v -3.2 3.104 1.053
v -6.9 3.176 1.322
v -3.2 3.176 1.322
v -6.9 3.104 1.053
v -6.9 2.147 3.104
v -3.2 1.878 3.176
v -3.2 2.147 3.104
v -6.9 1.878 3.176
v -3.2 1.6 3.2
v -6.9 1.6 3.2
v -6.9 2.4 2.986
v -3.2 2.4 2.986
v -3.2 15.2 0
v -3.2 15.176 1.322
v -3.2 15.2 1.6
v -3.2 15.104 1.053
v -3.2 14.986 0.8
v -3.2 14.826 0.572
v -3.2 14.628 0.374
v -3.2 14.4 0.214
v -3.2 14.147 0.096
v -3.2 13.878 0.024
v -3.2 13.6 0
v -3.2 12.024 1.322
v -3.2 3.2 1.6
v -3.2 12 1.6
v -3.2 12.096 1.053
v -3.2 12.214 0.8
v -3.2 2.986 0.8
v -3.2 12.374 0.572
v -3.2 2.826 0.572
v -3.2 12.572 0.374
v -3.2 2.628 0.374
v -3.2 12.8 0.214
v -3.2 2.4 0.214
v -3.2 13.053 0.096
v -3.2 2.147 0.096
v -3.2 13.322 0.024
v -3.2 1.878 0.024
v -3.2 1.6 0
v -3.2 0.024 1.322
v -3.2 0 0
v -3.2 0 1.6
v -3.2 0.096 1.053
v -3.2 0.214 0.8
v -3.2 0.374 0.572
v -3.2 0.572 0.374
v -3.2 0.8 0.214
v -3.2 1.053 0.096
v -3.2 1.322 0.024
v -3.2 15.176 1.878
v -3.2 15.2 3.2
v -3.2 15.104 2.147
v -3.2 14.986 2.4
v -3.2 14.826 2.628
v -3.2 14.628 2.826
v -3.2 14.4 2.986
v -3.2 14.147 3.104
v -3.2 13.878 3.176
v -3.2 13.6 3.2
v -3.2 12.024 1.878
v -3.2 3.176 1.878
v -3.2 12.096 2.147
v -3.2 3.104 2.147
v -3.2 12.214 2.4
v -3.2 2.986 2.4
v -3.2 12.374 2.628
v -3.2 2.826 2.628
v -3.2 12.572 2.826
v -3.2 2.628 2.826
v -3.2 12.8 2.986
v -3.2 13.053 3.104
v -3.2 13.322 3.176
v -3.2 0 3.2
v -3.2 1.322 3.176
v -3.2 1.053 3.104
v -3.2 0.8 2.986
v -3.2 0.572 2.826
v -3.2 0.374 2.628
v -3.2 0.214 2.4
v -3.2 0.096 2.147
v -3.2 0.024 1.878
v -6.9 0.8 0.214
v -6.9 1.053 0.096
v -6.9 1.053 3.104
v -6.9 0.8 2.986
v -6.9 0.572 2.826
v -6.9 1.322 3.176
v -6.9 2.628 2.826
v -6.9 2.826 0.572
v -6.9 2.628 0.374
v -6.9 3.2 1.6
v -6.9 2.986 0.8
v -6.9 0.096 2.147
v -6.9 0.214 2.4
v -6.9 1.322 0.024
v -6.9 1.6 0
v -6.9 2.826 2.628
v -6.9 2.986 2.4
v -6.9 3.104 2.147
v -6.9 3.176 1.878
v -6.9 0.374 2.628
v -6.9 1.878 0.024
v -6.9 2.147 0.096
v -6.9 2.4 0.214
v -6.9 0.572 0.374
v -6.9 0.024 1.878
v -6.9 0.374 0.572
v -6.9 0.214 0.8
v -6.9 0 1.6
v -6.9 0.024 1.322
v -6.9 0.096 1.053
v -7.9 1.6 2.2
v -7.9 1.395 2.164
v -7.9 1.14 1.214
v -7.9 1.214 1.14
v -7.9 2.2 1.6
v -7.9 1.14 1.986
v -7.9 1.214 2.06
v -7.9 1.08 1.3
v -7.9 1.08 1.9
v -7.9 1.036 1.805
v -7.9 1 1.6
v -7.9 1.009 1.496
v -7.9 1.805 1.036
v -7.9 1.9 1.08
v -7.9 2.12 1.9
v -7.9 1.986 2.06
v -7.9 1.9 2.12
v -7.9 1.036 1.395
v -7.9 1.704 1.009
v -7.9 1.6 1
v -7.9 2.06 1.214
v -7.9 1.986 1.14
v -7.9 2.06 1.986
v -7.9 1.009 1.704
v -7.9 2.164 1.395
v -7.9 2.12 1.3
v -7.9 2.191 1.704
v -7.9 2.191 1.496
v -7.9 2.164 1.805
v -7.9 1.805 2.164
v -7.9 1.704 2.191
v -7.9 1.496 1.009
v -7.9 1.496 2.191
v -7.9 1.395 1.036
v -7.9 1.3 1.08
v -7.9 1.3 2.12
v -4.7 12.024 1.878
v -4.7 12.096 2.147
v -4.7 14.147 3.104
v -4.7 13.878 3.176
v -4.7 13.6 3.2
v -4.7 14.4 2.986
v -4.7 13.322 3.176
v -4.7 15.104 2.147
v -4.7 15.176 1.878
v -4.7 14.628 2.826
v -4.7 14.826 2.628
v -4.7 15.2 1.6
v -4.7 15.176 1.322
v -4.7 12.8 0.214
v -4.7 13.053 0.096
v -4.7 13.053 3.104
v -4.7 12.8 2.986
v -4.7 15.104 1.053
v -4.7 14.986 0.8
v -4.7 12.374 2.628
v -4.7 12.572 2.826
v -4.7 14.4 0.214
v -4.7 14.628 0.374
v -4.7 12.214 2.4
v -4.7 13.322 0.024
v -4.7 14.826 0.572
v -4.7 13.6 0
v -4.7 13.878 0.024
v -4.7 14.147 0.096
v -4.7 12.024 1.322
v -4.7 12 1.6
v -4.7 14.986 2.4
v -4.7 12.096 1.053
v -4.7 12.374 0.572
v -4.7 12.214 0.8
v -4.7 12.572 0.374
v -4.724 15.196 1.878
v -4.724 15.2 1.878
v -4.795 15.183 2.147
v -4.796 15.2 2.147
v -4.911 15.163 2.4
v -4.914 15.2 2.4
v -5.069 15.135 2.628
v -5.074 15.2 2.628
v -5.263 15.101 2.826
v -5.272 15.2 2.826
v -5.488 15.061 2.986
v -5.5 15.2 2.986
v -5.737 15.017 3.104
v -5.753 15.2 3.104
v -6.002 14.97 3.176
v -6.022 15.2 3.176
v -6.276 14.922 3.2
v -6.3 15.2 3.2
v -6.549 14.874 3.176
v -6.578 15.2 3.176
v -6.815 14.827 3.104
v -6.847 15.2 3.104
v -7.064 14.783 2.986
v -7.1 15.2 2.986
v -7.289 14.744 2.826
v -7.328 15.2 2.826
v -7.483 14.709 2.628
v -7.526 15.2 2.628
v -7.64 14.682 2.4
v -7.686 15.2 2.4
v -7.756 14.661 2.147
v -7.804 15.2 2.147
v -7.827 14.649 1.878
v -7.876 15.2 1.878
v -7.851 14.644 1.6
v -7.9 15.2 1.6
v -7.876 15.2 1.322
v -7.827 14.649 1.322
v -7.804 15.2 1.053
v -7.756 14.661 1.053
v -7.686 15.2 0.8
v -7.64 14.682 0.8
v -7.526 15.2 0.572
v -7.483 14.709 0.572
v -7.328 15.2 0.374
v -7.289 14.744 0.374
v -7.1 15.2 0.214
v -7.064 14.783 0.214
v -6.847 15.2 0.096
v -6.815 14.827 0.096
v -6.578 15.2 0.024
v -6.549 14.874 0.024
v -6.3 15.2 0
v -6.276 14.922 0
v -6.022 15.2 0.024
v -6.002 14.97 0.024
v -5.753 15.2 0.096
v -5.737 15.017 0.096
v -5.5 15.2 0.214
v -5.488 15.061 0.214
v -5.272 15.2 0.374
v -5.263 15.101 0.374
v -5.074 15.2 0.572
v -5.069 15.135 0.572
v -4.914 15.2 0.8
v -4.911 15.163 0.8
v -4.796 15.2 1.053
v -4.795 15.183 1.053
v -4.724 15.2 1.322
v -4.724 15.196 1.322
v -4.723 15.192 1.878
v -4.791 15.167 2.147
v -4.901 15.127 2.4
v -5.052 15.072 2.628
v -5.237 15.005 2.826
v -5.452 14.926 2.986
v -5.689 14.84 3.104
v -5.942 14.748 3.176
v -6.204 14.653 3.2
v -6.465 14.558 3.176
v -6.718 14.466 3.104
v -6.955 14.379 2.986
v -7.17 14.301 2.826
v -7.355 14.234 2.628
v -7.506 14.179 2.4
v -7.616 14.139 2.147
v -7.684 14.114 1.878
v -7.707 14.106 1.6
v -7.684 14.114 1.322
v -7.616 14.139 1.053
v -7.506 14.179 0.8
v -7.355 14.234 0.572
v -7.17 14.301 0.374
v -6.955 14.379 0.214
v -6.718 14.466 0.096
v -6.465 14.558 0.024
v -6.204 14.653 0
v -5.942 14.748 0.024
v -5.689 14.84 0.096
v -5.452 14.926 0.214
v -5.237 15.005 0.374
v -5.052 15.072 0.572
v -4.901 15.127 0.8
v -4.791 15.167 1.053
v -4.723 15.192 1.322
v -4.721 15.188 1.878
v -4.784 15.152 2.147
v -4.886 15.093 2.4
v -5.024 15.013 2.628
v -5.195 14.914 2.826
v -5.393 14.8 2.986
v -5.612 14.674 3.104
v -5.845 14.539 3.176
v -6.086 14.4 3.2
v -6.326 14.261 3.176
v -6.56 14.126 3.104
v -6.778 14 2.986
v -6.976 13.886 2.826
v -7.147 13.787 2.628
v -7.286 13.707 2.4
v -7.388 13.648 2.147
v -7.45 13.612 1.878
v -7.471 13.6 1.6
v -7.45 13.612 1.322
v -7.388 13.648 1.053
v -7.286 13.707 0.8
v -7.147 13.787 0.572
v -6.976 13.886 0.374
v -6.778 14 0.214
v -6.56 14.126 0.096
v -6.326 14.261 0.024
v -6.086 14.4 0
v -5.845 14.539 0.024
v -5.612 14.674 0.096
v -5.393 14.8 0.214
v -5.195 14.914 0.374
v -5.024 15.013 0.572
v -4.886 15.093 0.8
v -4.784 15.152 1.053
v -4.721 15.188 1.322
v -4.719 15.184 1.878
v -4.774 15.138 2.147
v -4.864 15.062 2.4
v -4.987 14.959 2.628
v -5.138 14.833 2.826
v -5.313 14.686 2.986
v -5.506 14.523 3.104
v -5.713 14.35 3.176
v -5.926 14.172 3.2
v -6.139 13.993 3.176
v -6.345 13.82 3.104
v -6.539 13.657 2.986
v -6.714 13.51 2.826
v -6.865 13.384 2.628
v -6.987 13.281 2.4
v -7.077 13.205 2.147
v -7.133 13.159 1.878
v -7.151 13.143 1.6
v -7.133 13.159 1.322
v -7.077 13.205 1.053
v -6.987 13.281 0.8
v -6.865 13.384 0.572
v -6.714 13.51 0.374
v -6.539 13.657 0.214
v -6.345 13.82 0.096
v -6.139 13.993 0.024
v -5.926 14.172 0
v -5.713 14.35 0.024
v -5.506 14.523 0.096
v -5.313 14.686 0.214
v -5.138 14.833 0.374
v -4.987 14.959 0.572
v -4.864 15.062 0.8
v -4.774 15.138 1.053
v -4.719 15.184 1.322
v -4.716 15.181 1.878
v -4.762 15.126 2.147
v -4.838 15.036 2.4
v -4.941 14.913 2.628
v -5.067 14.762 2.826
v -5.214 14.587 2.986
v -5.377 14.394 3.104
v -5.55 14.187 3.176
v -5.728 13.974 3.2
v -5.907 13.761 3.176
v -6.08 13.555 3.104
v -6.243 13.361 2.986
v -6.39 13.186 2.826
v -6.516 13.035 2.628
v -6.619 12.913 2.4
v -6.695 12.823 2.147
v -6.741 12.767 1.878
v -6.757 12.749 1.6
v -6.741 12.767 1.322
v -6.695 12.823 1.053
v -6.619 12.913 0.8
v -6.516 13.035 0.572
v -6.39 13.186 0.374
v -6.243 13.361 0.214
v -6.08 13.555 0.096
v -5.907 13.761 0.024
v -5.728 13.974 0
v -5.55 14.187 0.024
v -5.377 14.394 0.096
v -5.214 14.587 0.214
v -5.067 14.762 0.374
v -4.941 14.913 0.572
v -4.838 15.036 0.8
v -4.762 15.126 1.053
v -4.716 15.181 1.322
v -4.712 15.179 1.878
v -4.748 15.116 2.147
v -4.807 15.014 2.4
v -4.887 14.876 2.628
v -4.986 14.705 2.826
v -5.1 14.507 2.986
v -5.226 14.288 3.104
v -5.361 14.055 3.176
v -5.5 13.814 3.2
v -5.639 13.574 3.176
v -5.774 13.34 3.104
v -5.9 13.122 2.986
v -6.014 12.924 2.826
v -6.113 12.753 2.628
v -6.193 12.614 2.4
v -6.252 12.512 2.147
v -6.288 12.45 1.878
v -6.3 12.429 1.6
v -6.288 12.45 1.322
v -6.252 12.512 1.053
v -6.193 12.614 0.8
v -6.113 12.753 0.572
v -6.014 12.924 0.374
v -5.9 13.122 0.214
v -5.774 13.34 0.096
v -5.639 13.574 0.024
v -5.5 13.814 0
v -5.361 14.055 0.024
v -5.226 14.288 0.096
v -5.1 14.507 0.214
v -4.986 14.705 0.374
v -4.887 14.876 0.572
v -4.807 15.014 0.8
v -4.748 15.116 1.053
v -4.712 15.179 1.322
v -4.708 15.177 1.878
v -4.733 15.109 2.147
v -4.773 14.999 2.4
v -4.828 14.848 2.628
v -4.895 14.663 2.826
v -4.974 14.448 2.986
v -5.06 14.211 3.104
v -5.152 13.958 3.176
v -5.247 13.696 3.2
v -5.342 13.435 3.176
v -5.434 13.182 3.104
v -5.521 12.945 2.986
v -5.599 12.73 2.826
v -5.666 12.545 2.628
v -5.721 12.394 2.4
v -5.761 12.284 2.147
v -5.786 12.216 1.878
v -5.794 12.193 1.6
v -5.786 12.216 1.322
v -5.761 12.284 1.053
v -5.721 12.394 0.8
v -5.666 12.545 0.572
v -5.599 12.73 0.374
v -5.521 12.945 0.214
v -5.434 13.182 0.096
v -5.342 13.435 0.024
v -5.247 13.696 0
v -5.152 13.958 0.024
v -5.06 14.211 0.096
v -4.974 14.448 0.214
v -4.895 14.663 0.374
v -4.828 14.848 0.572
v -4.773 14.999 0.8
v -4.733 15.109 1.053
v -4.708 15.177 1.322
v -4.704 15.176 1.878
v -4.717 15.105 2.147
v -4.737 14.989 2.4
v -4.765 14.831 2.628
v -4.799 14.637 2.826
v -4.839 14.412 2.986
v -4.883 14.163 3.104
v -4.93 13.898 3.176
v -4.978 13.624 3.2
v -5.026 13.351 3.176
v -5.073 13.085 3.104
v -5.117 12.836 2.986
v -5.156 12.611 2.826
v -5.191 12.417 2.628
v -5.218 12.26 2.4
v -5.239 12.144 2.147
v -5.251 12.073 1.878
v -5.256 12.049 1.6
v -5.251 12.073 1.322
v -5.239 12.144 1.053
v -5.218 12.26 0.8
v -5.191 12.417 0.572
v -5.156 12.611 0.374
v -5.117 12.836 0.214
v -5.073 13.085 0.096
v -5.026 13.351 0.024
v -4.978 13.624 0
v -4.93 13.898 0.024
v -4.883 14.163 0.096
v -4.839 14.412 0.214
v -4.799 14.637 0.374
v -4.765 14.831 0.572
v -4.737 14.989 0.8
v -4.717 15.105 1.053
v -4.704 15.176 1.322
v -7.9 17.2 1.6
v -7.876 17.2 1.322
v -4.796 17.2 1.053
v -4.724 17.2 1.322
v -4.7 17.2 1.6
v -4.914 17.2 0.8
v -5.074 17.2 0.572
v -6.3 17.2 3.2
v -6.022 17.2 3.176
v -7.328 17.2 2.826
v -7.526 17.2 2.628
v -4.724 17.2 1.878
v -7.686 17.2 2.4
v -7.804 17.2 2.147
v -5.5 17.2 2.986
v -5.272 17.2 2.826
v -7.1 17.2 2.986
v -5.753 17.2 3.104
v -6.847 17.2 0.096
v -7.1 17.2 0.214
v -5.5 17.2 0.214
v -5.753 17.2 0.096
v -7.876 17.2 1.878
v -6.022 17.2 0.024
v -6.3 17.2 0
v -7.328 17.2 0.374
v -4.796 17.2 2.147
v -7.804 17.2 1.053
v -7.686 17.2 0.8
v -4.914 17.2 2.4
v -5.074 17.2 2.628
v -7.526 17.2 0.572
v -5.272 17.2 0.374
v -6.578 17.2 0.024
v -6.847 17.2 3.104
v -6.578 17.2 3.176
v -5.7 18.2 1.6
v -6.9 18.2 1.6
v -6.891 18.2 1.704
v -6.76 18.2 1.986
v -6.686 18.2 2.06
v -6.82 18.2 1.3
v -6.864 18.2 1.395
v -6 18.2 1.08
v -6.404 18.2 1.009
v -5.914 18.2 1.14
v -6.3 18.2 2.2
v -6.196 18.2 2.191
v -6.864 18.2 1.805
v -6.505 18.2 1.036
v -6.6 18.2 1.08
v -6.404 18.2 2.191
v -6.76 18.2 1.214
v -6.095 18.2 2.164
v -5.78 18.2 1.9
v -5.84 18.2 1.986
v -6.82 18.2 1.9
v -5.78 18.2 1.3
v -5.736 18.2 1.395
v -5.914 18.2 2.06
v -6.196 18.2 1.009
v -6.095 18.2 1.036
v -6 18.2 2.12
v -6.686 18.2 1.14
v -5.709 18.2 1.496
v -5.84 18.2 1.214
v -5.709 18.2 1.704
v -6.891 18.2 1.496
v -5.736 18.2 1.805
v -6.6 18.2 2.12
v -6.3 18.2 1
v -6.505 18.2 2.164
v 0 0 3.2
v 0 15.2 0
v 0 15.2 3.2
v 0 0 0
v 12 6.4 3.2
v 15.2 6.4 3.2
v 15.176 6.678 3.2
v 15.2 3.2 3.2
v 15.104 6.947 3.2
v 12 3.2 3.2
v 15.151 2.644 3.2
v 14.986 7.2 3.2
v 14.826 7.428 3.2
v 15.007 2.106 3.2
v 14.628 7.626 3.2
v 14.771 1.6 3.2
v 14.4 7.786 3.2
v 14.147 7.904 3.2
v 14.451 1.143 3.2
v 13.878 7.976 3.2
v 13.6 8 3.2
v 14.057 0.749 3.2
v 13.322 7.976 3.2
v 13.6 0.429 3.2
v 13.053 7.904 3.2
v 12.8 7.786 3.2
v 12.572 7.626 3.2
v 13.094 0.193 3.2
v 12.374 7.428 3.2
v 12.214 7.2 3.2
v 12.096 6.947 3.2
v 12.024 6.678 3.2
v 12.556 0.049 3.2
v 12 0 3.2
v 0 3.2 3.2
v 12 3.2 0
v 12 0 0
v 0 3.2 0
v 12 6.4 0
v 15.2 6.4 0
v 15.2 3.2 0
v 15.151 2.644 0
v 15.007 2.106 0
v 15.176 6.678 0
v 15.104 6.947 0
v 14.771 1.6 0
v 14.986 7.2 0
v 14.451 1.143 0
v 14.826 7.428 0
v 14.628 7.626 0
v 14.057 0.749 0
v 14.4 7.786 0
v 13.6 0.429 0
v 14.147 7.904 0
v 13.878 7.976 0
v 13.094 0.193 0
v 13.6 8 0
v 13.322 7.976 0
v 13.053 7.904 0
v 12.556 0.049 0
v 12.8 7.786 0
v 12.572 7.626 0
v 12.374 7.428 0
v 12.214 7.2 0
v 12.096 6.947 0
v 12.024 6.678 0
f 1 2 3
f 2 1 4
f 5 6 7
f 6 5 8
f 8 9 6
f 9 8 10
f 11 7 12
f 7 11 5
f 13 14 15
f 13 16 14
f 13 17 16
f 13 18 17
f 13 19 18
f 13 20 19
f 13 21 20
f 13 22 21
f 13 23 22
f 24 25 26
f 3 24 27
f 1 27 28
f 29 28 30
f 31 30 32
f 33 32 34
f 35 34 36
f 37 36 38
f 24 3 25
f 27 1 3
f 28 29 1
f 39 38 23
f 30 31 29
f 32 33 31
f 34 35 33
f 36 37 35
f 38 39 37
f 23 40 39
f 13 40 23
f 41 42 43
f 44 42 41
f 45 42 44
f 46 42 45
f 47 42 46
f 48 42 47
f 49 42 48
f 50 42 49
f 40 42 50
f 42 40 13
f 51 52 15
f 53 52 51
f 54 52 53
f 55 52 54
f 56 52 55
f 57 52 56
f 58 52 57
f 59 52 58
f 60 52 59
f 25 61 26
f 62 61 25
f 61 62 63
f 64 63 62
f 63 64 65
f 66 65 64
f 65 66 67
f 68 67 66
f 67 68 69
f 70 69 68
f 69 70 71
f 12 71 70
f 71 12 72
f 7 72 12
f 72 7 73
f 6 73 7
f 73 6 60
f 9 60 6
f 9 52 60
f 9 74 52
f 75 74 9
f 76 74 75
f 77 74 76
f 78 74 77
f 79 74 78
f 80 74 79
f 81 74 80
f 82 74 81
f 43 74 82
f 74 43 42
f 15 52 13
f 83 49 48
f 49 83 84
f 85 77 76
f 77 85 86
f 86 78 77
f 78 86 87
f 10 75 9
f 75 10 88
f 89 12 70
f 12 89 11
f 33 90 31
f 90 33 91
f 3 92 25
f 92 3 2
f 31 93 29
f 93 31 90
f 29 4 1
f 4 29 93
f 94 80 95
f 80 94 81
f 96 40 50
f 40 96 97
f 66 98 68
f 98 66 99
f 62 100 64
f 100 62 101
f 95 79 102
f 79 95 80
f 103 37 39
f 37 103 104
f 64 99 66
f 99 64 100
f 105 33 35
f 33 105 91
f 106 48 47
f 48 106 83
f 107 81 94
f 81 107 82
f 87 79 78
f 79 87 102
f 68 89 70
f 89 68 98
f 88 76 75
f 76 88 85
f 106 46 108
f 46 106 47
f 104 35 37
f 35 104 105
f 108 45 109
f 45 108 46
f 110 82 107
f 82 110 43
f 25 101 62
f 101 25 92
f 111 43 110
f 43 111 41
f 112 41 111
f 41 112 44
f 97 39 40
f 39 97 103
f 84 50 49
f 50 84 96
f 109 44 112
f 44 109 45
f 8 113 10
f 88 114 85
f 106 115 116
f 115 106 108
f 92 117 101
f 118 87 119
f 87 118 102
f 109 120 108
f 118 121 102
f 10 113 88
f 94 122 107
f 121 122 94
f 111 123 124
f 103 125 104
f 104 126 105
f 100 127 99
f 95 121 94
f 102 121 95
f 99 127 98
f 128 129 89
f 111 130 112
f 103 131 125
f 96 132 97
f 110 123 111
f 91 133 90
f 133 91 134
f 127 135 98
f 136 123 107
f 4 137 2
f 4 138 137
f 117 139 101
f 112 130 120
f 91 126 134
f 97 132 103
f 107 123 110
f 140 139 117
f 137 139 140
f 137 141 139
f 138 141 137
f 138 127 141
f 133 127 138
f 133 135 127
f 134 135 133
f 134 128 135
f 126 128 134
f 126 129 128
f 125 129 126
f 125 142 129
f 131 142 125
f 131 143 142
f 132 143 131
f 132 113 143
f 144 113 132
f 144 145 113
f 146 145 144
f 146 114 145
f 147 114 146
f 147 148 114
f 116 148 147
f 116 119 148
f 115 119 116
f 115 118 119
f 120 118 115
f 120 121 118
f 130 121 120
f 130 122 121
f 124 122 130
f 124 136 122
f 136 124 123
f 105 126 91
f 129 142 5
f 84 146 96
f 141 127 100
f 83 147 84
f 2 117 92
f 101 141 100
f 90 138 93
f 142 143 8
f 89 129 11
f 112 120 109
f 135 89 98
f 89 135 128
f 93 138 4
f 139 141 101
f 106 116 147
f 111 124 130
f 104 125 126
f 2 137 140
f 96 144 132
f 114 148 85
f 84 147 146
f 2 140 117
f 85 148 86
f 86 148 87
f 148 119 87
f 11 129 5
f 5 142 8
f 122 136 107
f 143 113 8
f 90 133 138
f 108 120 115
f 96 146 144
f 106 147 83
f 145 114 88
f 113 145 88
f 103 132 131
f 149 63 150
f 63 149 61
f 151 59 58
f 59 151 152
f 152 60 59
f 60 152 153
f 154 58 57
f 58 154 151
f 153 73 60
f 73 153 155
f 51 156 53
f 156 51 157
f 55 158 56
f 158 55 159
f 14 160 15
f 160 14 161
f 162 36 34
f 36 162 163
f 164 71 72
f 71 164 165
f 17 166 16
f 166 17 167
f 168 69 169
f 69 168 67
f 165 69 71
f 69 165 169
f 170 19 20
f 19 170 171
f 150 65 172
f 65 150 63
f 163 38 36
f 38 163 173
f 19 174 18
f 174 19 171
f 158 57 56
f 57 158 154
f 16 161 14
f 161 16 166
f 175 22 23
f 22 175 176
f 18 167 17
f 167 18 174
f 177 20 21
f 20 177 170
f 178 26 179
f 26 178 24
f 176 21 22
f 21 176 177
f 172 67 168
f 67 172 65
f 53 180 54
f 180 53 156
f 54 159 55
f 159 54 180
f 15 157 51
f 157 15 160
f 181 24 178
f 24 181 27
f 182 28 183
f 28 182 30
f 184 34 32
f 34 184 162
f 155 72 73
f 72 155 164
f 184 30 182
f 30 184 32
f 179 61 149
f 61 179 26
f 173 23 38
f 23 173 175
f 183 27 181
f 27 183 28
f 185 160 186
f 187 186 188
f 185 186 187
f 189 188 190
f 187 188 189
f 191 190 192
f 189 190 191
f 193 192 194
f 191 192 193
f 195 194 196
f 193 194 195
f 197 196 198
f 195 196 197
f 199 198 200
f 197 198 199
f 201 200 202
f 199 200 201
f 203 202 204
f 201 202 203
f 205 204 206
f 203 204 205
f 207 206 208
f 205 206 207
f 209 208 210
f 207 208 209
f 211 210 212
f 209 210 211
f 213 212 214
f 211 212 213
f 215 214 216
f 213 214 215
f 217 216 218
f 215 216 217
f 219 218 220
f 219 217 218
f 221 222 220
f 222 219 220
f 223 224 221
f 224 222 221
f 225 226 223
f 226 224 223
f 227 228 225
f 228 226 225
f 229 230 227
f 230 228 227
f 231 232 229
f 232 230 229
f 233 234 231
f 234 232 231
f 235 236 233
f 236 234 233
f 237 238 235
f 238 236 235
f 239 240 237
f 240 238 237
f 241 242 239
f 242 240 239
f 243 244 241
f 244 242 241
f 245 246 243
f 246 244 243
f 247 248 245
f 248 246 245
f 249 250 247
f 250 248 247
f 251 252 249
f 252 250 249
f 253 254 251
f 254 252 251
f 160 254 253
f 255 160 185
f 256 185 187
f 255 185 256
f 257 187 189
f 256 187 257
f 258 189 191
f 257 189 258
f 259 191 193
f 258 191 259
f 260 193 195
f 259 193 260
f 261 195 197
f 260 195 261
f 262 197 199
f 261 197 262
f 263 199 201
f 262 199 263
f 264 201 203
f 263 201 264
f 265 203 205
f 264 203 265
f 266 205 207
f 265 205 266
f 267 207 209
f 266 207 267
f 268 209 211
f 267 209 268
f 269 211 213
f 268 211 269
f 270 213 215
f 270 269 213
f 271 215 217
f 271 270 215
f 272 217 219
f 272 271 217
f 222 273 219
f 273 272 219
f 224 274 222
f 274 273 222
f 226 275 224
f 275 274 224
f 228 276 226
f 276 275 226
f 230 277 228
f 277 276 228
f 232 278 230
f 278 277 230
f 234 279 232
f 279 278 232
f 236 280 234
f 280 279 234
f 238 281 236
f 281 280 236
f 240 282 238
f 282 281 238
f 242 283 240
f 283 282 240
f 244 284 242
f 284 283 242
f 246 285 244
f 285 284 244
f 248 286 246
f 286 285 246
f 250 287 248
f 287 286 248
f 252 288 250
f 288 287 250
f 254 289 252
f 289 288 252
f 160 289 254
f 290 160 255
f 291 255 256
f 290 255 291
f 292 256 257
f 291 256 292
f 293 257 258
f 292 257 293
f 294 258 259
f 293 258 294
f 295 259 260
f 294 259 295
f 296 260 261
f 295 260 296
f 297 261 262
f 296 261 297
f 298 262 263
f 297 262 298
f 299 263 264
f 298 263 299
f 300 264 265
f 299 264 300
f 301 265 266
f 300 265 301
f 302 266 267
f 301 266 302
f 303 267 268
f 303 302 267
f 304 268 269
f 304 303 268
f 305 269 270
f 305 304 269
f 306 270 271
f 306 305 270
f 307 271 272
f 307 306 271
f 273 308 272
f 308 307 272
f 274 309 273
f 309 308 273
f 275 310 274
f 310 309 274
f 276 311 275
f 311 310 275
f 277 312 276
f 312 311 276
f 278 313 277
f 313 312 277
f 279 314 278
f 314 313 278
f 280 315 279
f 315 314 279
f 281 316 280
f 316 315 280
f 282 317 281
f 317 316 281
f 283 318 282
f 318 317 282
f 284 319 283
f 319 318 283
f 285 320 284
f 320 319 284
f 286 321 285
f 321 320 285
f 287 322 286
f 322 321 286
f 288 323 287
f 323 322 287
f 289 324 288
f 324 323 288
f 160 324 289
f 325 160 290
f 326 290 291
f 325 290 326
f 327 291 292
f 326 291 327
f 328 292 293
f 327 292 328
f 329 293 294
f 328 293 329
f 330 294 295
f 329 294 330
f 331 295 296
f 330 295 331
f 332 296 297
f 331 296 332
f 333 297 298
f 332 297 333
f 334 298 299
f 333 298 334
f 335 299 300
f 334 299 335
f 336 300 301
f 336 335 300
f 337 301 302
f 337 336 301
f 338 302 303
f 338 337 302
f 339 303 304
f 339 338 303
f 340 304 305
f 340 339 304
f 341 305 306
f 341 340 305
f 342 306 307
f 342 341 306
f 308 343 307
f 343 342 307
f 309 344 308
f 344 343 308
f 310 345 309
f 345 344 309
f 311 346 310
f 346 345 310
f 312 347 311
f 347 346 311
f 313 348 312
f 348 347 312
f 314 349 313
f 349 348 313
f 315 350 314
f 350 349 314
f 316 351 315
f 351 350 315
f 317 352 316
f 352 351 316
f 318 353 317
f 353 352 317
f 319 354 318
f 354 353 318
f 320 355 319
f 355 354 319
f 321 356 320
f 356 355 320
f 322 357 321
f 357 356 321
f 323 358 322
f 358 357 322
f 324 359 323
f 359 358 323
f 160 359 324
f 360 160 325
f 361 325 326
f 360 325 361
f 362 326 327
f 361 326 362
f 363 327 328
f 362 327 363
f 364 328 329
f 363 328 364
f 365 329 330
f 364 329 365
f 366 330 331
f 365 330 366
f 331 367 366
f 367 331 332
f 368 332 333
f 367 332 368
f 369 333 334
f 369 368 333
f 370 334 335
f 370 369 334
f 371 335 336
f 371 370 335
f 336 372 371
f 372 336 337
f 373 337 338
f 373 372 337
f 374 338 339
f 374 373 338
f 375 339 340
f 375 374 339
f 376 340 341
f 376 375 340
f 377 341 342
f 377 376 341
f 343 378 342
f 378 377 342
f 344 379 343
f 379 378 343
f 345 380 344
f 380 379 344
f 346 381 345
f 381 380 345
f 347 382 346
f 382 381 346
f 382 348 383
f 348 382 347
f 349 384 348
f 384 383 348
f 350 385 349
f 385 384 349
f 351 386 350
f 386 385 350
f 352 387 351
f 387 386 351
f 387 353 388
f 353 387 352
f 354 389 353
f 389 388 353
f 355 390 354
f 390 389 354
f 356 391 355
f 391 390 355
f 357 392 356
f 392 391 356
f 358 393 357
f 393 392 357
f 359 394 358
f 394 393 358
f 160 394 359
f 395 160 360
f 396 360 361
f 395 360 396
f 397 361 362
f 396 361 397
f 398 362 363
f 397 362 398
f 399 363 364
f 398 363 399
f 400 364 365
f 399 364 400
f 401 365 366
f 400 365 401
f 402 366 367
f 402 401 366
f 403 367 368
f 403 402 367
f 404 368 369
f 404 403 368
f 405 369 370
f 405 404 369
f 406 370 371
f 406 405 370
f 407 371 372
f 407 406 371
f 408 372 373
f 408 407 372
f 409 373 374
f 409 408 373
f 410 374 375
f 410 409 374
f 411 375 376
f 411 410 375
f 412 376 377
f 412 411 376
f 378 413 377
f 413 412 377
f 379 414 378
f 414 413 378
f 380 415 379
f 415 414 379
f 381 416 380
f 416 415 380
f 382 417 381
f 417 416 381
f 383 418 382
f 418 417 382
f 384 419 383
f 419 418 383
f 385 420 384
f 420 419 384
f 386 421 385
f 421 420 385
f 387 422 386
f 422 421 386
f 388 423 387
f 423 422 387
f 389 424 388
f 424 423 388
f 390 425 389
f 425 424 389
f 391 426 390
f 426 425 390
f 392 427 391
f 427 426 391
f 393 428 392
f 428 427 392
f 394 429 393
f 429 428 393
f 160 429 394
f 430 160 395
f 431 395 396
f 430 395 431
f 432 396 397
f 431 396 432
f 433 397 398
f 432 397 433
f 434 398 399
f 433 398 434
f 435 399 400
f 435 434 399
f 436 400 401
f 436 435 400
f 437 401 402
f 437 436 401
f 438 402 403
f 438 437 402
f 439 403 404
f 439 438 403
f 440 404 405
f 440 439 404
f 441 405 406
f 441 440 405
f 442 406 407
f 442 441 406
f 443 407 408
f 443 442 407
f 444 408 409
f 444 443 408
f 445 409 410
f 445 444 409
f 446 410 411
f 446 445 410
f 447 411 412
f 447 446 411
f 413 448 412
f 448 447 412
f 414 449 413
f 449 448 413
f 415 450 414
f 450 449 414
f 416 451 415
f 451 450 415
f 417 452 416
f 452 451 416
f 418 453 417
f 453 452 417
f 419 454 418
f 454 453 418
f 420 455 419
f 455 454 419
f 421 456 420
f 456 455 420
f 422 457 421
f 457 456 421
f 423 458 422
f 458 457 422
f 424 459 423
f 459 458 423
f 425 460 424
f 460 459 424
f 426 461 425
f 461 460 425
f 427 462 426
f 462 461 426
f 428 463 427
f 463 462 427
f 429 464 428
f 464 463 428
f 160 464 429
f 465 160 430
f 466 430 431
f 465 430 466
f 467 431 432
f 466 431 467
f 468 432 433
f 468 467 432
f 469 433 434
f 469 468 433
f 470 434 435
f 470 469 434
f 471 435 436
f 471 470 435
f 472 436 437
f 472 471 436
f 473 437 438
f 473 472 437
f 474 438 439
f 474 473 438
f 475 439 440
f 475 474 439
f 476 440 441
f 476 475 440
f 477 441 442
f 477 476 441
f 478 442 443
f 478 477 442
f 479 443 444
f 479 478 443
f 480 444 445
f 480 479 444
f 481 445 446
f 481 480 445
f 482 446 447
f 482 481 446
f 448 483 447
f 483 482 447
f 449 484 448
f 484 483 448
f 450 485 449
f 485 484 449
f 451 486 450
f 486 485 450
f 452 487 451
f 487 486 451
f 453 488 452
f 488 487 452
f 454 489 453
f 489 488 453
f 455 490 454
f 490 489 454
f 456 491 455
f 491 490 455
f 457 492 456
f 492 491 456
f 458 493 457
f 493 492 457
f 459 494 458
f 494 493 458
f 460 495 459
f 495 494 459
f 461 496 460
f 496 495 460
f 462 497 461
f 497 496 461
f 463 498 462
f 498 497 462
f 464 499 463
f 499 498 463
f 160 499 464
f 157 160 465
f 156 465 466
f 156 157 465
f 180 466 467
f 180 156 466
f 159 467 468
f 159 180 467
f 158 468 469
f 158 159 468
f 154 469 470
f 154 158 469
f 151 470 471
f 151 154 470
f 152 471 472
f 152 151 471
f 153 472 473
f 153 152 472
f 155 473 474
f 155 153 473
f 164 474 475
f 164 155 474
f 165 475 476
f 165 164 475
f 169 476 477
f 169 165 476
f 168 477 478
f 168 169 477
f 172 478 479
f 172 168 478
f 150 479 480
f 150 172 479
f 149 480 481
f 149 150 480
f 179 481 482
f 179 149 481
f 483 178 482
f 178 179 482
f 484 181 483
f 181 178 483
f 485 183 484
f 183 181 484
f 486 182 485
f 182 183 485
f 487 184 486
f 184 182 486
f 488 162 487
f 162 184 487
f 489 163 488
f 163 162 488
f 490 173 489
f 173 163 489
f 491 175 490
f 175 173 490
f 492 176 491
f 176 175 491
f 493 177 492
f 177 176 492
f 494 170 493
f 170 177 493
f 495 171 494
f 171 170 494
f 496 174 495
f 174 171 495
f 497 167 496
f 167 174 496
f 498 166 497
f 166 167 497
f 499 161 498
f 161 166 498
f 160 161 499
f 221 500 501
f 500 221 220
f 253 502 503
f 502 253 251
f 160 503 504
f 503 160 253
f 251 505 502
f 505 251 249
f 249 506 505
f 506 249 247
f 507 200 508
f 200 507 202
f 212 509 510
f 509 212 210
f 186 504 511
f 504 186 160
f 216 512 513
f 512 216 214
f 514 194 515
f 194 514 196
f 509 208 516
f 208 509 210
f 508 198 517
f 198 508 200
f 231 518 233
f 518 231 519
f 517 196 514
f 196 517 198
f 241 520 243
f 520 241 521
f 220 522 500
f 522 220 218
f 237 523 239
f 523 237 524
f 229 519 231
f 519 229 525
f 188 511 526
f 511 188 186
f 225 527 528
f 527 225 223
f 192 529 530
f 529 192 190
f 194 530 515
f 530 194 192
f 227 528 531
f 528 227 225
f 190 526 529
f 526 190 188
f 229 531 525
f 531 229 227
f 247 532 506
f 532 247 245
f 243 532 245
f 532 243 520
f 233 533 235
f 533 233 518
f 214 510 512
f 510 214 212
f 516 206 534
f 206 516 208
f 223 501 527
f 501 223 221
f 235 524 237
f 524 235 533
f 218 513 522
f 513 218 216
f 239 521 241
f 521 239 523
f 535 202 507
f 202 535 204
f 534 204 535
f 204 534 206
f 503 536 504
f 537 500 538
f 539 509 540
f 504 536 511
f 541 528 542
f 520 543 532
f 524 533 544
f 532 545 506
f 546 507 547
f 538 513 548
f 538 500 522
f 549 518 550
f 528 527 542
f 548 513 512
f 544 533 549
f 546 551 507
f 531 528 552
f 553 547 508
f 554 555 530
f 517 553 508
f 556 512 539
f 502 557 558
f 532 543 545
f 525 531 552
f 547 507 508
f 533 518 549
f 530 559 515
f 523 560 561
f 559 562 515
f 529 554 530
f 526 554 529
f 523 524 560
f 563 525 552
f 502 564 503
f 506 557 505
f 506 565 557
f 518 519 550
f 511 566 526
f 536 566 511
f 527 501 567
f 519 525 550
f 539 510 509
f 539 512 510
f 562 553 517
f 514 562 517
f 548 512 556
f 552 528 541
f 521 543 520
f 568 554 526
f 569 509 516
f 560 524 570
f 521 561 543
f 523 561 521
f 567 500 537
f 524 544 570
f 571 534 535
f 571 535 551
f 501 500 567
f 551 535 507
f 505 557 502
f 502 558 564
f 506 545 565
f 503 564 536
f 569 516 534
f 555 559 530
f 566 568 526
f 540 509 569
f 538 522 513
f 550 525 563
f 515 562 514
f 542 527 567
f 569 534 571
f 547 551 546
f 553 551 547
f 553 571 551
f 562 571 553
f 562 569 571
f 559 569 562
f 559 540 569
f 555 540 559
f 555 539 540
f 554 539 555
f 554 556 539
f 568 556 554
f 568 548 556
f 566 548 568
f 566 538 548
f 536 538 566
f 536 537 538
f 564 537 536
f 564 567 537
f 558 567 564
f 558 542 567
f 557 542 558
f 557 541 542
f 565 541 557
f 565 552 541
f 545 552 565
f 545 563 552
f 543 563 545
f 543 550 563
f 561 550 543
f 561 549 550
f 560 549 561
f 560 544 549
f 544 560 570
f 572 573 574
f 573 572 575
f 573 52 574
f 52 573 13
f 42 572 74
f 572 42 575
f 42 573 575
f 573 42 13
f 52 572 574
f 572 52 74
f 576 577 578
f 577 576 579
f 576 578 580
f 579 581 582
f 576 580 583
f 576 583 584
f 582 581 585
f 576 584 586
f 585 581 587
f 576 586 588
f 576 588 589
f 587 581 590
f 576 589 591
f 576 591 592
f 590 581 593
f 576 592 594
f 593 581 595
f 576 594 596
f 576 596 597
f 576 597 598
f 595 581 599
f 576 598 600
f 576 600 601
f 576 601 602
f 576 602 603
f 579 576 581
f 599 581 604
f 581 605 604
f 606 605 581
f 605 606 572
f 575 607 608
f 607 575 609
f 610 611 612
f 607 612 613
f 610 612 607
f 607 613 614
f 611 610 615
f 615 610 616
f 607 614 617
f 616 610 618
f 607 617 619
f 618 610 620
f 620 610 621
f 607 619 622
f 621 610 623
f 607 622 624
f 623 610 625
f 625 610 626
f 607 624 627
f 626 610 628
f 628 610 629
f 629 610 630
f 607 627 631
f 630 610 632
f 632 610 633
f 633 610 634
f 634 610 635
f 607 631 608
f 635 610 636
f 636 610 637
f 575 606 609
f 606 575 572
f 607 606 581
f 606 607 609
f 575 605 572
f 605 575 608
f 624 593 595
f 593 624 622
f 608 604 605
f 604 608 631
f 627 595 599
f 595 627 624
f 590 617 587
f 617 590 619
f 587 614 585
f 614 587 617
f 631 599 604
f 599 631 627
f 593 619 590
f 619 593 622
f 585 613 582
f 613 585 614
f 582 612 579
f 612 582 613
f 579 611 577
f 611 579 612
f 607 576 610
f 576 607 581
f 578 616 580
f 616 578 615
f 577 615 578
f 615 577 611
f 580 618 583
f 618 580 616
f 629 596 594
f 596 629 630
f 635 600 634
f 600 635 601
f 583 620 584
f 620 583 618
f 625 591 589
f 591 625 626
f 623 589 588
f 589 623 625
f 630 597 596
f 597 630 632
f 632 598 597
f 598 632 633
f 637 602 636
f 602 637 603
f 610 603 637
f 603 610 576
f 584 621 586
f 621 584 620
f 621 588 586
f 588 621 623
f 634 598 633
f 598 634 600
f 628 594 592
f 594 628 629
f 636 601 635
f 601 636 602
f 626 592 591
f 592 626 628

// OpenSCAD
// file: main.scad
rpeg = 1.60; // radius of peg. Also used for almost everything else.

/* [Hidden] */
dpeg = 2.0 * rpeg;

module rounded_plate(thickness=dpeg, width = 12, height=12)
{
    thalf = thickness/2.0;
    cube([thalf, dpeg + width, height + dpeg]);
		translate([thalf, thalf]) cube([thalf, dpeg + width - thickness, height + dpeg]);
		translate([thalf, thalf]) cylinder(height + dpeg, thalf, thalf);
		translate([thalf, dpeg + width - thalf]) cylinder(height + dpeg, thalf, thalf);
}

module base(sep = 1, width = 1, dist = 1, thickness = rpeg * 2, rounded = false)
{
	w = width - 1;

	for(i = [0:dist:w])
		translate([0, (i * 12) + rpeg, rpeg]) rotate([90, 0]) pegs(sep);
    
	//backplate
	if(rounded == false)
		cube([thickness, dpeg + (w * 12), sep * 12 + dpeg]);
	else
        rounded_plate(thickness, w*12, sep*12);
}

module pegs(sep)
{
	s = sep * 12;
	depth = 1.5;
	r = rpeg;

	rotate([0, -90])
	{
		cylinder(depth - 1 + (r * 2), r, r);
		translate([0, 0, depth - 1 + (r * 2)]) cylinder(1, r, r - 1);
		translate([0, s]) cylinder(depth, r, r);
	}
	translate([-depth, s + r]) rotate_extrude(angle=90) translate([-r, 0]) circle(r);
	translate([-depth - r, s + r]) rotate([-90]) cylinder(2, r, r);
	translate([-depth - r, s + r + 2]) rotate([-90, 0]) cylinder(1, r, r - 1);
}

//base(1, 3, 1, rounded = false);
// main file
include <main.scad> // base(), rpeg
length = 12;
nwidth = 1;
nheight = 1;

/* [Hidden] */
$fn = 36;

module hook()
{
	translate([-dpeg, 0, dpeg]) rotate([-90, 0]) base(nheight, nwidth, 1);

    w = 12 * (nwidth-1) + dpeg;
    h = 12 * (nheight-1);
    translate([0, h ,-w + dpeg]) {
        cube([length, dpeg, w]);
        translate([length, dpeg]) rotate_extrude(angle=-90) square([dpeg, w]);
        translate([length, dpeg]) cube([dpeg, dpeg, w]);
        translate([length + rpeg, dpeg * 2]) cylinder(w, rpeg, rpeg);
        
        // support
        if(nheight > 1) {
            slength = sqrt(pow(length, 2) + pow(h, 2));
            sangle = acos(length / slength);
            translate([0, -h, 0]) rotate([0,0,sangle]) cube([slength, dpeg, w]);
        }
    }   
}

hook();
